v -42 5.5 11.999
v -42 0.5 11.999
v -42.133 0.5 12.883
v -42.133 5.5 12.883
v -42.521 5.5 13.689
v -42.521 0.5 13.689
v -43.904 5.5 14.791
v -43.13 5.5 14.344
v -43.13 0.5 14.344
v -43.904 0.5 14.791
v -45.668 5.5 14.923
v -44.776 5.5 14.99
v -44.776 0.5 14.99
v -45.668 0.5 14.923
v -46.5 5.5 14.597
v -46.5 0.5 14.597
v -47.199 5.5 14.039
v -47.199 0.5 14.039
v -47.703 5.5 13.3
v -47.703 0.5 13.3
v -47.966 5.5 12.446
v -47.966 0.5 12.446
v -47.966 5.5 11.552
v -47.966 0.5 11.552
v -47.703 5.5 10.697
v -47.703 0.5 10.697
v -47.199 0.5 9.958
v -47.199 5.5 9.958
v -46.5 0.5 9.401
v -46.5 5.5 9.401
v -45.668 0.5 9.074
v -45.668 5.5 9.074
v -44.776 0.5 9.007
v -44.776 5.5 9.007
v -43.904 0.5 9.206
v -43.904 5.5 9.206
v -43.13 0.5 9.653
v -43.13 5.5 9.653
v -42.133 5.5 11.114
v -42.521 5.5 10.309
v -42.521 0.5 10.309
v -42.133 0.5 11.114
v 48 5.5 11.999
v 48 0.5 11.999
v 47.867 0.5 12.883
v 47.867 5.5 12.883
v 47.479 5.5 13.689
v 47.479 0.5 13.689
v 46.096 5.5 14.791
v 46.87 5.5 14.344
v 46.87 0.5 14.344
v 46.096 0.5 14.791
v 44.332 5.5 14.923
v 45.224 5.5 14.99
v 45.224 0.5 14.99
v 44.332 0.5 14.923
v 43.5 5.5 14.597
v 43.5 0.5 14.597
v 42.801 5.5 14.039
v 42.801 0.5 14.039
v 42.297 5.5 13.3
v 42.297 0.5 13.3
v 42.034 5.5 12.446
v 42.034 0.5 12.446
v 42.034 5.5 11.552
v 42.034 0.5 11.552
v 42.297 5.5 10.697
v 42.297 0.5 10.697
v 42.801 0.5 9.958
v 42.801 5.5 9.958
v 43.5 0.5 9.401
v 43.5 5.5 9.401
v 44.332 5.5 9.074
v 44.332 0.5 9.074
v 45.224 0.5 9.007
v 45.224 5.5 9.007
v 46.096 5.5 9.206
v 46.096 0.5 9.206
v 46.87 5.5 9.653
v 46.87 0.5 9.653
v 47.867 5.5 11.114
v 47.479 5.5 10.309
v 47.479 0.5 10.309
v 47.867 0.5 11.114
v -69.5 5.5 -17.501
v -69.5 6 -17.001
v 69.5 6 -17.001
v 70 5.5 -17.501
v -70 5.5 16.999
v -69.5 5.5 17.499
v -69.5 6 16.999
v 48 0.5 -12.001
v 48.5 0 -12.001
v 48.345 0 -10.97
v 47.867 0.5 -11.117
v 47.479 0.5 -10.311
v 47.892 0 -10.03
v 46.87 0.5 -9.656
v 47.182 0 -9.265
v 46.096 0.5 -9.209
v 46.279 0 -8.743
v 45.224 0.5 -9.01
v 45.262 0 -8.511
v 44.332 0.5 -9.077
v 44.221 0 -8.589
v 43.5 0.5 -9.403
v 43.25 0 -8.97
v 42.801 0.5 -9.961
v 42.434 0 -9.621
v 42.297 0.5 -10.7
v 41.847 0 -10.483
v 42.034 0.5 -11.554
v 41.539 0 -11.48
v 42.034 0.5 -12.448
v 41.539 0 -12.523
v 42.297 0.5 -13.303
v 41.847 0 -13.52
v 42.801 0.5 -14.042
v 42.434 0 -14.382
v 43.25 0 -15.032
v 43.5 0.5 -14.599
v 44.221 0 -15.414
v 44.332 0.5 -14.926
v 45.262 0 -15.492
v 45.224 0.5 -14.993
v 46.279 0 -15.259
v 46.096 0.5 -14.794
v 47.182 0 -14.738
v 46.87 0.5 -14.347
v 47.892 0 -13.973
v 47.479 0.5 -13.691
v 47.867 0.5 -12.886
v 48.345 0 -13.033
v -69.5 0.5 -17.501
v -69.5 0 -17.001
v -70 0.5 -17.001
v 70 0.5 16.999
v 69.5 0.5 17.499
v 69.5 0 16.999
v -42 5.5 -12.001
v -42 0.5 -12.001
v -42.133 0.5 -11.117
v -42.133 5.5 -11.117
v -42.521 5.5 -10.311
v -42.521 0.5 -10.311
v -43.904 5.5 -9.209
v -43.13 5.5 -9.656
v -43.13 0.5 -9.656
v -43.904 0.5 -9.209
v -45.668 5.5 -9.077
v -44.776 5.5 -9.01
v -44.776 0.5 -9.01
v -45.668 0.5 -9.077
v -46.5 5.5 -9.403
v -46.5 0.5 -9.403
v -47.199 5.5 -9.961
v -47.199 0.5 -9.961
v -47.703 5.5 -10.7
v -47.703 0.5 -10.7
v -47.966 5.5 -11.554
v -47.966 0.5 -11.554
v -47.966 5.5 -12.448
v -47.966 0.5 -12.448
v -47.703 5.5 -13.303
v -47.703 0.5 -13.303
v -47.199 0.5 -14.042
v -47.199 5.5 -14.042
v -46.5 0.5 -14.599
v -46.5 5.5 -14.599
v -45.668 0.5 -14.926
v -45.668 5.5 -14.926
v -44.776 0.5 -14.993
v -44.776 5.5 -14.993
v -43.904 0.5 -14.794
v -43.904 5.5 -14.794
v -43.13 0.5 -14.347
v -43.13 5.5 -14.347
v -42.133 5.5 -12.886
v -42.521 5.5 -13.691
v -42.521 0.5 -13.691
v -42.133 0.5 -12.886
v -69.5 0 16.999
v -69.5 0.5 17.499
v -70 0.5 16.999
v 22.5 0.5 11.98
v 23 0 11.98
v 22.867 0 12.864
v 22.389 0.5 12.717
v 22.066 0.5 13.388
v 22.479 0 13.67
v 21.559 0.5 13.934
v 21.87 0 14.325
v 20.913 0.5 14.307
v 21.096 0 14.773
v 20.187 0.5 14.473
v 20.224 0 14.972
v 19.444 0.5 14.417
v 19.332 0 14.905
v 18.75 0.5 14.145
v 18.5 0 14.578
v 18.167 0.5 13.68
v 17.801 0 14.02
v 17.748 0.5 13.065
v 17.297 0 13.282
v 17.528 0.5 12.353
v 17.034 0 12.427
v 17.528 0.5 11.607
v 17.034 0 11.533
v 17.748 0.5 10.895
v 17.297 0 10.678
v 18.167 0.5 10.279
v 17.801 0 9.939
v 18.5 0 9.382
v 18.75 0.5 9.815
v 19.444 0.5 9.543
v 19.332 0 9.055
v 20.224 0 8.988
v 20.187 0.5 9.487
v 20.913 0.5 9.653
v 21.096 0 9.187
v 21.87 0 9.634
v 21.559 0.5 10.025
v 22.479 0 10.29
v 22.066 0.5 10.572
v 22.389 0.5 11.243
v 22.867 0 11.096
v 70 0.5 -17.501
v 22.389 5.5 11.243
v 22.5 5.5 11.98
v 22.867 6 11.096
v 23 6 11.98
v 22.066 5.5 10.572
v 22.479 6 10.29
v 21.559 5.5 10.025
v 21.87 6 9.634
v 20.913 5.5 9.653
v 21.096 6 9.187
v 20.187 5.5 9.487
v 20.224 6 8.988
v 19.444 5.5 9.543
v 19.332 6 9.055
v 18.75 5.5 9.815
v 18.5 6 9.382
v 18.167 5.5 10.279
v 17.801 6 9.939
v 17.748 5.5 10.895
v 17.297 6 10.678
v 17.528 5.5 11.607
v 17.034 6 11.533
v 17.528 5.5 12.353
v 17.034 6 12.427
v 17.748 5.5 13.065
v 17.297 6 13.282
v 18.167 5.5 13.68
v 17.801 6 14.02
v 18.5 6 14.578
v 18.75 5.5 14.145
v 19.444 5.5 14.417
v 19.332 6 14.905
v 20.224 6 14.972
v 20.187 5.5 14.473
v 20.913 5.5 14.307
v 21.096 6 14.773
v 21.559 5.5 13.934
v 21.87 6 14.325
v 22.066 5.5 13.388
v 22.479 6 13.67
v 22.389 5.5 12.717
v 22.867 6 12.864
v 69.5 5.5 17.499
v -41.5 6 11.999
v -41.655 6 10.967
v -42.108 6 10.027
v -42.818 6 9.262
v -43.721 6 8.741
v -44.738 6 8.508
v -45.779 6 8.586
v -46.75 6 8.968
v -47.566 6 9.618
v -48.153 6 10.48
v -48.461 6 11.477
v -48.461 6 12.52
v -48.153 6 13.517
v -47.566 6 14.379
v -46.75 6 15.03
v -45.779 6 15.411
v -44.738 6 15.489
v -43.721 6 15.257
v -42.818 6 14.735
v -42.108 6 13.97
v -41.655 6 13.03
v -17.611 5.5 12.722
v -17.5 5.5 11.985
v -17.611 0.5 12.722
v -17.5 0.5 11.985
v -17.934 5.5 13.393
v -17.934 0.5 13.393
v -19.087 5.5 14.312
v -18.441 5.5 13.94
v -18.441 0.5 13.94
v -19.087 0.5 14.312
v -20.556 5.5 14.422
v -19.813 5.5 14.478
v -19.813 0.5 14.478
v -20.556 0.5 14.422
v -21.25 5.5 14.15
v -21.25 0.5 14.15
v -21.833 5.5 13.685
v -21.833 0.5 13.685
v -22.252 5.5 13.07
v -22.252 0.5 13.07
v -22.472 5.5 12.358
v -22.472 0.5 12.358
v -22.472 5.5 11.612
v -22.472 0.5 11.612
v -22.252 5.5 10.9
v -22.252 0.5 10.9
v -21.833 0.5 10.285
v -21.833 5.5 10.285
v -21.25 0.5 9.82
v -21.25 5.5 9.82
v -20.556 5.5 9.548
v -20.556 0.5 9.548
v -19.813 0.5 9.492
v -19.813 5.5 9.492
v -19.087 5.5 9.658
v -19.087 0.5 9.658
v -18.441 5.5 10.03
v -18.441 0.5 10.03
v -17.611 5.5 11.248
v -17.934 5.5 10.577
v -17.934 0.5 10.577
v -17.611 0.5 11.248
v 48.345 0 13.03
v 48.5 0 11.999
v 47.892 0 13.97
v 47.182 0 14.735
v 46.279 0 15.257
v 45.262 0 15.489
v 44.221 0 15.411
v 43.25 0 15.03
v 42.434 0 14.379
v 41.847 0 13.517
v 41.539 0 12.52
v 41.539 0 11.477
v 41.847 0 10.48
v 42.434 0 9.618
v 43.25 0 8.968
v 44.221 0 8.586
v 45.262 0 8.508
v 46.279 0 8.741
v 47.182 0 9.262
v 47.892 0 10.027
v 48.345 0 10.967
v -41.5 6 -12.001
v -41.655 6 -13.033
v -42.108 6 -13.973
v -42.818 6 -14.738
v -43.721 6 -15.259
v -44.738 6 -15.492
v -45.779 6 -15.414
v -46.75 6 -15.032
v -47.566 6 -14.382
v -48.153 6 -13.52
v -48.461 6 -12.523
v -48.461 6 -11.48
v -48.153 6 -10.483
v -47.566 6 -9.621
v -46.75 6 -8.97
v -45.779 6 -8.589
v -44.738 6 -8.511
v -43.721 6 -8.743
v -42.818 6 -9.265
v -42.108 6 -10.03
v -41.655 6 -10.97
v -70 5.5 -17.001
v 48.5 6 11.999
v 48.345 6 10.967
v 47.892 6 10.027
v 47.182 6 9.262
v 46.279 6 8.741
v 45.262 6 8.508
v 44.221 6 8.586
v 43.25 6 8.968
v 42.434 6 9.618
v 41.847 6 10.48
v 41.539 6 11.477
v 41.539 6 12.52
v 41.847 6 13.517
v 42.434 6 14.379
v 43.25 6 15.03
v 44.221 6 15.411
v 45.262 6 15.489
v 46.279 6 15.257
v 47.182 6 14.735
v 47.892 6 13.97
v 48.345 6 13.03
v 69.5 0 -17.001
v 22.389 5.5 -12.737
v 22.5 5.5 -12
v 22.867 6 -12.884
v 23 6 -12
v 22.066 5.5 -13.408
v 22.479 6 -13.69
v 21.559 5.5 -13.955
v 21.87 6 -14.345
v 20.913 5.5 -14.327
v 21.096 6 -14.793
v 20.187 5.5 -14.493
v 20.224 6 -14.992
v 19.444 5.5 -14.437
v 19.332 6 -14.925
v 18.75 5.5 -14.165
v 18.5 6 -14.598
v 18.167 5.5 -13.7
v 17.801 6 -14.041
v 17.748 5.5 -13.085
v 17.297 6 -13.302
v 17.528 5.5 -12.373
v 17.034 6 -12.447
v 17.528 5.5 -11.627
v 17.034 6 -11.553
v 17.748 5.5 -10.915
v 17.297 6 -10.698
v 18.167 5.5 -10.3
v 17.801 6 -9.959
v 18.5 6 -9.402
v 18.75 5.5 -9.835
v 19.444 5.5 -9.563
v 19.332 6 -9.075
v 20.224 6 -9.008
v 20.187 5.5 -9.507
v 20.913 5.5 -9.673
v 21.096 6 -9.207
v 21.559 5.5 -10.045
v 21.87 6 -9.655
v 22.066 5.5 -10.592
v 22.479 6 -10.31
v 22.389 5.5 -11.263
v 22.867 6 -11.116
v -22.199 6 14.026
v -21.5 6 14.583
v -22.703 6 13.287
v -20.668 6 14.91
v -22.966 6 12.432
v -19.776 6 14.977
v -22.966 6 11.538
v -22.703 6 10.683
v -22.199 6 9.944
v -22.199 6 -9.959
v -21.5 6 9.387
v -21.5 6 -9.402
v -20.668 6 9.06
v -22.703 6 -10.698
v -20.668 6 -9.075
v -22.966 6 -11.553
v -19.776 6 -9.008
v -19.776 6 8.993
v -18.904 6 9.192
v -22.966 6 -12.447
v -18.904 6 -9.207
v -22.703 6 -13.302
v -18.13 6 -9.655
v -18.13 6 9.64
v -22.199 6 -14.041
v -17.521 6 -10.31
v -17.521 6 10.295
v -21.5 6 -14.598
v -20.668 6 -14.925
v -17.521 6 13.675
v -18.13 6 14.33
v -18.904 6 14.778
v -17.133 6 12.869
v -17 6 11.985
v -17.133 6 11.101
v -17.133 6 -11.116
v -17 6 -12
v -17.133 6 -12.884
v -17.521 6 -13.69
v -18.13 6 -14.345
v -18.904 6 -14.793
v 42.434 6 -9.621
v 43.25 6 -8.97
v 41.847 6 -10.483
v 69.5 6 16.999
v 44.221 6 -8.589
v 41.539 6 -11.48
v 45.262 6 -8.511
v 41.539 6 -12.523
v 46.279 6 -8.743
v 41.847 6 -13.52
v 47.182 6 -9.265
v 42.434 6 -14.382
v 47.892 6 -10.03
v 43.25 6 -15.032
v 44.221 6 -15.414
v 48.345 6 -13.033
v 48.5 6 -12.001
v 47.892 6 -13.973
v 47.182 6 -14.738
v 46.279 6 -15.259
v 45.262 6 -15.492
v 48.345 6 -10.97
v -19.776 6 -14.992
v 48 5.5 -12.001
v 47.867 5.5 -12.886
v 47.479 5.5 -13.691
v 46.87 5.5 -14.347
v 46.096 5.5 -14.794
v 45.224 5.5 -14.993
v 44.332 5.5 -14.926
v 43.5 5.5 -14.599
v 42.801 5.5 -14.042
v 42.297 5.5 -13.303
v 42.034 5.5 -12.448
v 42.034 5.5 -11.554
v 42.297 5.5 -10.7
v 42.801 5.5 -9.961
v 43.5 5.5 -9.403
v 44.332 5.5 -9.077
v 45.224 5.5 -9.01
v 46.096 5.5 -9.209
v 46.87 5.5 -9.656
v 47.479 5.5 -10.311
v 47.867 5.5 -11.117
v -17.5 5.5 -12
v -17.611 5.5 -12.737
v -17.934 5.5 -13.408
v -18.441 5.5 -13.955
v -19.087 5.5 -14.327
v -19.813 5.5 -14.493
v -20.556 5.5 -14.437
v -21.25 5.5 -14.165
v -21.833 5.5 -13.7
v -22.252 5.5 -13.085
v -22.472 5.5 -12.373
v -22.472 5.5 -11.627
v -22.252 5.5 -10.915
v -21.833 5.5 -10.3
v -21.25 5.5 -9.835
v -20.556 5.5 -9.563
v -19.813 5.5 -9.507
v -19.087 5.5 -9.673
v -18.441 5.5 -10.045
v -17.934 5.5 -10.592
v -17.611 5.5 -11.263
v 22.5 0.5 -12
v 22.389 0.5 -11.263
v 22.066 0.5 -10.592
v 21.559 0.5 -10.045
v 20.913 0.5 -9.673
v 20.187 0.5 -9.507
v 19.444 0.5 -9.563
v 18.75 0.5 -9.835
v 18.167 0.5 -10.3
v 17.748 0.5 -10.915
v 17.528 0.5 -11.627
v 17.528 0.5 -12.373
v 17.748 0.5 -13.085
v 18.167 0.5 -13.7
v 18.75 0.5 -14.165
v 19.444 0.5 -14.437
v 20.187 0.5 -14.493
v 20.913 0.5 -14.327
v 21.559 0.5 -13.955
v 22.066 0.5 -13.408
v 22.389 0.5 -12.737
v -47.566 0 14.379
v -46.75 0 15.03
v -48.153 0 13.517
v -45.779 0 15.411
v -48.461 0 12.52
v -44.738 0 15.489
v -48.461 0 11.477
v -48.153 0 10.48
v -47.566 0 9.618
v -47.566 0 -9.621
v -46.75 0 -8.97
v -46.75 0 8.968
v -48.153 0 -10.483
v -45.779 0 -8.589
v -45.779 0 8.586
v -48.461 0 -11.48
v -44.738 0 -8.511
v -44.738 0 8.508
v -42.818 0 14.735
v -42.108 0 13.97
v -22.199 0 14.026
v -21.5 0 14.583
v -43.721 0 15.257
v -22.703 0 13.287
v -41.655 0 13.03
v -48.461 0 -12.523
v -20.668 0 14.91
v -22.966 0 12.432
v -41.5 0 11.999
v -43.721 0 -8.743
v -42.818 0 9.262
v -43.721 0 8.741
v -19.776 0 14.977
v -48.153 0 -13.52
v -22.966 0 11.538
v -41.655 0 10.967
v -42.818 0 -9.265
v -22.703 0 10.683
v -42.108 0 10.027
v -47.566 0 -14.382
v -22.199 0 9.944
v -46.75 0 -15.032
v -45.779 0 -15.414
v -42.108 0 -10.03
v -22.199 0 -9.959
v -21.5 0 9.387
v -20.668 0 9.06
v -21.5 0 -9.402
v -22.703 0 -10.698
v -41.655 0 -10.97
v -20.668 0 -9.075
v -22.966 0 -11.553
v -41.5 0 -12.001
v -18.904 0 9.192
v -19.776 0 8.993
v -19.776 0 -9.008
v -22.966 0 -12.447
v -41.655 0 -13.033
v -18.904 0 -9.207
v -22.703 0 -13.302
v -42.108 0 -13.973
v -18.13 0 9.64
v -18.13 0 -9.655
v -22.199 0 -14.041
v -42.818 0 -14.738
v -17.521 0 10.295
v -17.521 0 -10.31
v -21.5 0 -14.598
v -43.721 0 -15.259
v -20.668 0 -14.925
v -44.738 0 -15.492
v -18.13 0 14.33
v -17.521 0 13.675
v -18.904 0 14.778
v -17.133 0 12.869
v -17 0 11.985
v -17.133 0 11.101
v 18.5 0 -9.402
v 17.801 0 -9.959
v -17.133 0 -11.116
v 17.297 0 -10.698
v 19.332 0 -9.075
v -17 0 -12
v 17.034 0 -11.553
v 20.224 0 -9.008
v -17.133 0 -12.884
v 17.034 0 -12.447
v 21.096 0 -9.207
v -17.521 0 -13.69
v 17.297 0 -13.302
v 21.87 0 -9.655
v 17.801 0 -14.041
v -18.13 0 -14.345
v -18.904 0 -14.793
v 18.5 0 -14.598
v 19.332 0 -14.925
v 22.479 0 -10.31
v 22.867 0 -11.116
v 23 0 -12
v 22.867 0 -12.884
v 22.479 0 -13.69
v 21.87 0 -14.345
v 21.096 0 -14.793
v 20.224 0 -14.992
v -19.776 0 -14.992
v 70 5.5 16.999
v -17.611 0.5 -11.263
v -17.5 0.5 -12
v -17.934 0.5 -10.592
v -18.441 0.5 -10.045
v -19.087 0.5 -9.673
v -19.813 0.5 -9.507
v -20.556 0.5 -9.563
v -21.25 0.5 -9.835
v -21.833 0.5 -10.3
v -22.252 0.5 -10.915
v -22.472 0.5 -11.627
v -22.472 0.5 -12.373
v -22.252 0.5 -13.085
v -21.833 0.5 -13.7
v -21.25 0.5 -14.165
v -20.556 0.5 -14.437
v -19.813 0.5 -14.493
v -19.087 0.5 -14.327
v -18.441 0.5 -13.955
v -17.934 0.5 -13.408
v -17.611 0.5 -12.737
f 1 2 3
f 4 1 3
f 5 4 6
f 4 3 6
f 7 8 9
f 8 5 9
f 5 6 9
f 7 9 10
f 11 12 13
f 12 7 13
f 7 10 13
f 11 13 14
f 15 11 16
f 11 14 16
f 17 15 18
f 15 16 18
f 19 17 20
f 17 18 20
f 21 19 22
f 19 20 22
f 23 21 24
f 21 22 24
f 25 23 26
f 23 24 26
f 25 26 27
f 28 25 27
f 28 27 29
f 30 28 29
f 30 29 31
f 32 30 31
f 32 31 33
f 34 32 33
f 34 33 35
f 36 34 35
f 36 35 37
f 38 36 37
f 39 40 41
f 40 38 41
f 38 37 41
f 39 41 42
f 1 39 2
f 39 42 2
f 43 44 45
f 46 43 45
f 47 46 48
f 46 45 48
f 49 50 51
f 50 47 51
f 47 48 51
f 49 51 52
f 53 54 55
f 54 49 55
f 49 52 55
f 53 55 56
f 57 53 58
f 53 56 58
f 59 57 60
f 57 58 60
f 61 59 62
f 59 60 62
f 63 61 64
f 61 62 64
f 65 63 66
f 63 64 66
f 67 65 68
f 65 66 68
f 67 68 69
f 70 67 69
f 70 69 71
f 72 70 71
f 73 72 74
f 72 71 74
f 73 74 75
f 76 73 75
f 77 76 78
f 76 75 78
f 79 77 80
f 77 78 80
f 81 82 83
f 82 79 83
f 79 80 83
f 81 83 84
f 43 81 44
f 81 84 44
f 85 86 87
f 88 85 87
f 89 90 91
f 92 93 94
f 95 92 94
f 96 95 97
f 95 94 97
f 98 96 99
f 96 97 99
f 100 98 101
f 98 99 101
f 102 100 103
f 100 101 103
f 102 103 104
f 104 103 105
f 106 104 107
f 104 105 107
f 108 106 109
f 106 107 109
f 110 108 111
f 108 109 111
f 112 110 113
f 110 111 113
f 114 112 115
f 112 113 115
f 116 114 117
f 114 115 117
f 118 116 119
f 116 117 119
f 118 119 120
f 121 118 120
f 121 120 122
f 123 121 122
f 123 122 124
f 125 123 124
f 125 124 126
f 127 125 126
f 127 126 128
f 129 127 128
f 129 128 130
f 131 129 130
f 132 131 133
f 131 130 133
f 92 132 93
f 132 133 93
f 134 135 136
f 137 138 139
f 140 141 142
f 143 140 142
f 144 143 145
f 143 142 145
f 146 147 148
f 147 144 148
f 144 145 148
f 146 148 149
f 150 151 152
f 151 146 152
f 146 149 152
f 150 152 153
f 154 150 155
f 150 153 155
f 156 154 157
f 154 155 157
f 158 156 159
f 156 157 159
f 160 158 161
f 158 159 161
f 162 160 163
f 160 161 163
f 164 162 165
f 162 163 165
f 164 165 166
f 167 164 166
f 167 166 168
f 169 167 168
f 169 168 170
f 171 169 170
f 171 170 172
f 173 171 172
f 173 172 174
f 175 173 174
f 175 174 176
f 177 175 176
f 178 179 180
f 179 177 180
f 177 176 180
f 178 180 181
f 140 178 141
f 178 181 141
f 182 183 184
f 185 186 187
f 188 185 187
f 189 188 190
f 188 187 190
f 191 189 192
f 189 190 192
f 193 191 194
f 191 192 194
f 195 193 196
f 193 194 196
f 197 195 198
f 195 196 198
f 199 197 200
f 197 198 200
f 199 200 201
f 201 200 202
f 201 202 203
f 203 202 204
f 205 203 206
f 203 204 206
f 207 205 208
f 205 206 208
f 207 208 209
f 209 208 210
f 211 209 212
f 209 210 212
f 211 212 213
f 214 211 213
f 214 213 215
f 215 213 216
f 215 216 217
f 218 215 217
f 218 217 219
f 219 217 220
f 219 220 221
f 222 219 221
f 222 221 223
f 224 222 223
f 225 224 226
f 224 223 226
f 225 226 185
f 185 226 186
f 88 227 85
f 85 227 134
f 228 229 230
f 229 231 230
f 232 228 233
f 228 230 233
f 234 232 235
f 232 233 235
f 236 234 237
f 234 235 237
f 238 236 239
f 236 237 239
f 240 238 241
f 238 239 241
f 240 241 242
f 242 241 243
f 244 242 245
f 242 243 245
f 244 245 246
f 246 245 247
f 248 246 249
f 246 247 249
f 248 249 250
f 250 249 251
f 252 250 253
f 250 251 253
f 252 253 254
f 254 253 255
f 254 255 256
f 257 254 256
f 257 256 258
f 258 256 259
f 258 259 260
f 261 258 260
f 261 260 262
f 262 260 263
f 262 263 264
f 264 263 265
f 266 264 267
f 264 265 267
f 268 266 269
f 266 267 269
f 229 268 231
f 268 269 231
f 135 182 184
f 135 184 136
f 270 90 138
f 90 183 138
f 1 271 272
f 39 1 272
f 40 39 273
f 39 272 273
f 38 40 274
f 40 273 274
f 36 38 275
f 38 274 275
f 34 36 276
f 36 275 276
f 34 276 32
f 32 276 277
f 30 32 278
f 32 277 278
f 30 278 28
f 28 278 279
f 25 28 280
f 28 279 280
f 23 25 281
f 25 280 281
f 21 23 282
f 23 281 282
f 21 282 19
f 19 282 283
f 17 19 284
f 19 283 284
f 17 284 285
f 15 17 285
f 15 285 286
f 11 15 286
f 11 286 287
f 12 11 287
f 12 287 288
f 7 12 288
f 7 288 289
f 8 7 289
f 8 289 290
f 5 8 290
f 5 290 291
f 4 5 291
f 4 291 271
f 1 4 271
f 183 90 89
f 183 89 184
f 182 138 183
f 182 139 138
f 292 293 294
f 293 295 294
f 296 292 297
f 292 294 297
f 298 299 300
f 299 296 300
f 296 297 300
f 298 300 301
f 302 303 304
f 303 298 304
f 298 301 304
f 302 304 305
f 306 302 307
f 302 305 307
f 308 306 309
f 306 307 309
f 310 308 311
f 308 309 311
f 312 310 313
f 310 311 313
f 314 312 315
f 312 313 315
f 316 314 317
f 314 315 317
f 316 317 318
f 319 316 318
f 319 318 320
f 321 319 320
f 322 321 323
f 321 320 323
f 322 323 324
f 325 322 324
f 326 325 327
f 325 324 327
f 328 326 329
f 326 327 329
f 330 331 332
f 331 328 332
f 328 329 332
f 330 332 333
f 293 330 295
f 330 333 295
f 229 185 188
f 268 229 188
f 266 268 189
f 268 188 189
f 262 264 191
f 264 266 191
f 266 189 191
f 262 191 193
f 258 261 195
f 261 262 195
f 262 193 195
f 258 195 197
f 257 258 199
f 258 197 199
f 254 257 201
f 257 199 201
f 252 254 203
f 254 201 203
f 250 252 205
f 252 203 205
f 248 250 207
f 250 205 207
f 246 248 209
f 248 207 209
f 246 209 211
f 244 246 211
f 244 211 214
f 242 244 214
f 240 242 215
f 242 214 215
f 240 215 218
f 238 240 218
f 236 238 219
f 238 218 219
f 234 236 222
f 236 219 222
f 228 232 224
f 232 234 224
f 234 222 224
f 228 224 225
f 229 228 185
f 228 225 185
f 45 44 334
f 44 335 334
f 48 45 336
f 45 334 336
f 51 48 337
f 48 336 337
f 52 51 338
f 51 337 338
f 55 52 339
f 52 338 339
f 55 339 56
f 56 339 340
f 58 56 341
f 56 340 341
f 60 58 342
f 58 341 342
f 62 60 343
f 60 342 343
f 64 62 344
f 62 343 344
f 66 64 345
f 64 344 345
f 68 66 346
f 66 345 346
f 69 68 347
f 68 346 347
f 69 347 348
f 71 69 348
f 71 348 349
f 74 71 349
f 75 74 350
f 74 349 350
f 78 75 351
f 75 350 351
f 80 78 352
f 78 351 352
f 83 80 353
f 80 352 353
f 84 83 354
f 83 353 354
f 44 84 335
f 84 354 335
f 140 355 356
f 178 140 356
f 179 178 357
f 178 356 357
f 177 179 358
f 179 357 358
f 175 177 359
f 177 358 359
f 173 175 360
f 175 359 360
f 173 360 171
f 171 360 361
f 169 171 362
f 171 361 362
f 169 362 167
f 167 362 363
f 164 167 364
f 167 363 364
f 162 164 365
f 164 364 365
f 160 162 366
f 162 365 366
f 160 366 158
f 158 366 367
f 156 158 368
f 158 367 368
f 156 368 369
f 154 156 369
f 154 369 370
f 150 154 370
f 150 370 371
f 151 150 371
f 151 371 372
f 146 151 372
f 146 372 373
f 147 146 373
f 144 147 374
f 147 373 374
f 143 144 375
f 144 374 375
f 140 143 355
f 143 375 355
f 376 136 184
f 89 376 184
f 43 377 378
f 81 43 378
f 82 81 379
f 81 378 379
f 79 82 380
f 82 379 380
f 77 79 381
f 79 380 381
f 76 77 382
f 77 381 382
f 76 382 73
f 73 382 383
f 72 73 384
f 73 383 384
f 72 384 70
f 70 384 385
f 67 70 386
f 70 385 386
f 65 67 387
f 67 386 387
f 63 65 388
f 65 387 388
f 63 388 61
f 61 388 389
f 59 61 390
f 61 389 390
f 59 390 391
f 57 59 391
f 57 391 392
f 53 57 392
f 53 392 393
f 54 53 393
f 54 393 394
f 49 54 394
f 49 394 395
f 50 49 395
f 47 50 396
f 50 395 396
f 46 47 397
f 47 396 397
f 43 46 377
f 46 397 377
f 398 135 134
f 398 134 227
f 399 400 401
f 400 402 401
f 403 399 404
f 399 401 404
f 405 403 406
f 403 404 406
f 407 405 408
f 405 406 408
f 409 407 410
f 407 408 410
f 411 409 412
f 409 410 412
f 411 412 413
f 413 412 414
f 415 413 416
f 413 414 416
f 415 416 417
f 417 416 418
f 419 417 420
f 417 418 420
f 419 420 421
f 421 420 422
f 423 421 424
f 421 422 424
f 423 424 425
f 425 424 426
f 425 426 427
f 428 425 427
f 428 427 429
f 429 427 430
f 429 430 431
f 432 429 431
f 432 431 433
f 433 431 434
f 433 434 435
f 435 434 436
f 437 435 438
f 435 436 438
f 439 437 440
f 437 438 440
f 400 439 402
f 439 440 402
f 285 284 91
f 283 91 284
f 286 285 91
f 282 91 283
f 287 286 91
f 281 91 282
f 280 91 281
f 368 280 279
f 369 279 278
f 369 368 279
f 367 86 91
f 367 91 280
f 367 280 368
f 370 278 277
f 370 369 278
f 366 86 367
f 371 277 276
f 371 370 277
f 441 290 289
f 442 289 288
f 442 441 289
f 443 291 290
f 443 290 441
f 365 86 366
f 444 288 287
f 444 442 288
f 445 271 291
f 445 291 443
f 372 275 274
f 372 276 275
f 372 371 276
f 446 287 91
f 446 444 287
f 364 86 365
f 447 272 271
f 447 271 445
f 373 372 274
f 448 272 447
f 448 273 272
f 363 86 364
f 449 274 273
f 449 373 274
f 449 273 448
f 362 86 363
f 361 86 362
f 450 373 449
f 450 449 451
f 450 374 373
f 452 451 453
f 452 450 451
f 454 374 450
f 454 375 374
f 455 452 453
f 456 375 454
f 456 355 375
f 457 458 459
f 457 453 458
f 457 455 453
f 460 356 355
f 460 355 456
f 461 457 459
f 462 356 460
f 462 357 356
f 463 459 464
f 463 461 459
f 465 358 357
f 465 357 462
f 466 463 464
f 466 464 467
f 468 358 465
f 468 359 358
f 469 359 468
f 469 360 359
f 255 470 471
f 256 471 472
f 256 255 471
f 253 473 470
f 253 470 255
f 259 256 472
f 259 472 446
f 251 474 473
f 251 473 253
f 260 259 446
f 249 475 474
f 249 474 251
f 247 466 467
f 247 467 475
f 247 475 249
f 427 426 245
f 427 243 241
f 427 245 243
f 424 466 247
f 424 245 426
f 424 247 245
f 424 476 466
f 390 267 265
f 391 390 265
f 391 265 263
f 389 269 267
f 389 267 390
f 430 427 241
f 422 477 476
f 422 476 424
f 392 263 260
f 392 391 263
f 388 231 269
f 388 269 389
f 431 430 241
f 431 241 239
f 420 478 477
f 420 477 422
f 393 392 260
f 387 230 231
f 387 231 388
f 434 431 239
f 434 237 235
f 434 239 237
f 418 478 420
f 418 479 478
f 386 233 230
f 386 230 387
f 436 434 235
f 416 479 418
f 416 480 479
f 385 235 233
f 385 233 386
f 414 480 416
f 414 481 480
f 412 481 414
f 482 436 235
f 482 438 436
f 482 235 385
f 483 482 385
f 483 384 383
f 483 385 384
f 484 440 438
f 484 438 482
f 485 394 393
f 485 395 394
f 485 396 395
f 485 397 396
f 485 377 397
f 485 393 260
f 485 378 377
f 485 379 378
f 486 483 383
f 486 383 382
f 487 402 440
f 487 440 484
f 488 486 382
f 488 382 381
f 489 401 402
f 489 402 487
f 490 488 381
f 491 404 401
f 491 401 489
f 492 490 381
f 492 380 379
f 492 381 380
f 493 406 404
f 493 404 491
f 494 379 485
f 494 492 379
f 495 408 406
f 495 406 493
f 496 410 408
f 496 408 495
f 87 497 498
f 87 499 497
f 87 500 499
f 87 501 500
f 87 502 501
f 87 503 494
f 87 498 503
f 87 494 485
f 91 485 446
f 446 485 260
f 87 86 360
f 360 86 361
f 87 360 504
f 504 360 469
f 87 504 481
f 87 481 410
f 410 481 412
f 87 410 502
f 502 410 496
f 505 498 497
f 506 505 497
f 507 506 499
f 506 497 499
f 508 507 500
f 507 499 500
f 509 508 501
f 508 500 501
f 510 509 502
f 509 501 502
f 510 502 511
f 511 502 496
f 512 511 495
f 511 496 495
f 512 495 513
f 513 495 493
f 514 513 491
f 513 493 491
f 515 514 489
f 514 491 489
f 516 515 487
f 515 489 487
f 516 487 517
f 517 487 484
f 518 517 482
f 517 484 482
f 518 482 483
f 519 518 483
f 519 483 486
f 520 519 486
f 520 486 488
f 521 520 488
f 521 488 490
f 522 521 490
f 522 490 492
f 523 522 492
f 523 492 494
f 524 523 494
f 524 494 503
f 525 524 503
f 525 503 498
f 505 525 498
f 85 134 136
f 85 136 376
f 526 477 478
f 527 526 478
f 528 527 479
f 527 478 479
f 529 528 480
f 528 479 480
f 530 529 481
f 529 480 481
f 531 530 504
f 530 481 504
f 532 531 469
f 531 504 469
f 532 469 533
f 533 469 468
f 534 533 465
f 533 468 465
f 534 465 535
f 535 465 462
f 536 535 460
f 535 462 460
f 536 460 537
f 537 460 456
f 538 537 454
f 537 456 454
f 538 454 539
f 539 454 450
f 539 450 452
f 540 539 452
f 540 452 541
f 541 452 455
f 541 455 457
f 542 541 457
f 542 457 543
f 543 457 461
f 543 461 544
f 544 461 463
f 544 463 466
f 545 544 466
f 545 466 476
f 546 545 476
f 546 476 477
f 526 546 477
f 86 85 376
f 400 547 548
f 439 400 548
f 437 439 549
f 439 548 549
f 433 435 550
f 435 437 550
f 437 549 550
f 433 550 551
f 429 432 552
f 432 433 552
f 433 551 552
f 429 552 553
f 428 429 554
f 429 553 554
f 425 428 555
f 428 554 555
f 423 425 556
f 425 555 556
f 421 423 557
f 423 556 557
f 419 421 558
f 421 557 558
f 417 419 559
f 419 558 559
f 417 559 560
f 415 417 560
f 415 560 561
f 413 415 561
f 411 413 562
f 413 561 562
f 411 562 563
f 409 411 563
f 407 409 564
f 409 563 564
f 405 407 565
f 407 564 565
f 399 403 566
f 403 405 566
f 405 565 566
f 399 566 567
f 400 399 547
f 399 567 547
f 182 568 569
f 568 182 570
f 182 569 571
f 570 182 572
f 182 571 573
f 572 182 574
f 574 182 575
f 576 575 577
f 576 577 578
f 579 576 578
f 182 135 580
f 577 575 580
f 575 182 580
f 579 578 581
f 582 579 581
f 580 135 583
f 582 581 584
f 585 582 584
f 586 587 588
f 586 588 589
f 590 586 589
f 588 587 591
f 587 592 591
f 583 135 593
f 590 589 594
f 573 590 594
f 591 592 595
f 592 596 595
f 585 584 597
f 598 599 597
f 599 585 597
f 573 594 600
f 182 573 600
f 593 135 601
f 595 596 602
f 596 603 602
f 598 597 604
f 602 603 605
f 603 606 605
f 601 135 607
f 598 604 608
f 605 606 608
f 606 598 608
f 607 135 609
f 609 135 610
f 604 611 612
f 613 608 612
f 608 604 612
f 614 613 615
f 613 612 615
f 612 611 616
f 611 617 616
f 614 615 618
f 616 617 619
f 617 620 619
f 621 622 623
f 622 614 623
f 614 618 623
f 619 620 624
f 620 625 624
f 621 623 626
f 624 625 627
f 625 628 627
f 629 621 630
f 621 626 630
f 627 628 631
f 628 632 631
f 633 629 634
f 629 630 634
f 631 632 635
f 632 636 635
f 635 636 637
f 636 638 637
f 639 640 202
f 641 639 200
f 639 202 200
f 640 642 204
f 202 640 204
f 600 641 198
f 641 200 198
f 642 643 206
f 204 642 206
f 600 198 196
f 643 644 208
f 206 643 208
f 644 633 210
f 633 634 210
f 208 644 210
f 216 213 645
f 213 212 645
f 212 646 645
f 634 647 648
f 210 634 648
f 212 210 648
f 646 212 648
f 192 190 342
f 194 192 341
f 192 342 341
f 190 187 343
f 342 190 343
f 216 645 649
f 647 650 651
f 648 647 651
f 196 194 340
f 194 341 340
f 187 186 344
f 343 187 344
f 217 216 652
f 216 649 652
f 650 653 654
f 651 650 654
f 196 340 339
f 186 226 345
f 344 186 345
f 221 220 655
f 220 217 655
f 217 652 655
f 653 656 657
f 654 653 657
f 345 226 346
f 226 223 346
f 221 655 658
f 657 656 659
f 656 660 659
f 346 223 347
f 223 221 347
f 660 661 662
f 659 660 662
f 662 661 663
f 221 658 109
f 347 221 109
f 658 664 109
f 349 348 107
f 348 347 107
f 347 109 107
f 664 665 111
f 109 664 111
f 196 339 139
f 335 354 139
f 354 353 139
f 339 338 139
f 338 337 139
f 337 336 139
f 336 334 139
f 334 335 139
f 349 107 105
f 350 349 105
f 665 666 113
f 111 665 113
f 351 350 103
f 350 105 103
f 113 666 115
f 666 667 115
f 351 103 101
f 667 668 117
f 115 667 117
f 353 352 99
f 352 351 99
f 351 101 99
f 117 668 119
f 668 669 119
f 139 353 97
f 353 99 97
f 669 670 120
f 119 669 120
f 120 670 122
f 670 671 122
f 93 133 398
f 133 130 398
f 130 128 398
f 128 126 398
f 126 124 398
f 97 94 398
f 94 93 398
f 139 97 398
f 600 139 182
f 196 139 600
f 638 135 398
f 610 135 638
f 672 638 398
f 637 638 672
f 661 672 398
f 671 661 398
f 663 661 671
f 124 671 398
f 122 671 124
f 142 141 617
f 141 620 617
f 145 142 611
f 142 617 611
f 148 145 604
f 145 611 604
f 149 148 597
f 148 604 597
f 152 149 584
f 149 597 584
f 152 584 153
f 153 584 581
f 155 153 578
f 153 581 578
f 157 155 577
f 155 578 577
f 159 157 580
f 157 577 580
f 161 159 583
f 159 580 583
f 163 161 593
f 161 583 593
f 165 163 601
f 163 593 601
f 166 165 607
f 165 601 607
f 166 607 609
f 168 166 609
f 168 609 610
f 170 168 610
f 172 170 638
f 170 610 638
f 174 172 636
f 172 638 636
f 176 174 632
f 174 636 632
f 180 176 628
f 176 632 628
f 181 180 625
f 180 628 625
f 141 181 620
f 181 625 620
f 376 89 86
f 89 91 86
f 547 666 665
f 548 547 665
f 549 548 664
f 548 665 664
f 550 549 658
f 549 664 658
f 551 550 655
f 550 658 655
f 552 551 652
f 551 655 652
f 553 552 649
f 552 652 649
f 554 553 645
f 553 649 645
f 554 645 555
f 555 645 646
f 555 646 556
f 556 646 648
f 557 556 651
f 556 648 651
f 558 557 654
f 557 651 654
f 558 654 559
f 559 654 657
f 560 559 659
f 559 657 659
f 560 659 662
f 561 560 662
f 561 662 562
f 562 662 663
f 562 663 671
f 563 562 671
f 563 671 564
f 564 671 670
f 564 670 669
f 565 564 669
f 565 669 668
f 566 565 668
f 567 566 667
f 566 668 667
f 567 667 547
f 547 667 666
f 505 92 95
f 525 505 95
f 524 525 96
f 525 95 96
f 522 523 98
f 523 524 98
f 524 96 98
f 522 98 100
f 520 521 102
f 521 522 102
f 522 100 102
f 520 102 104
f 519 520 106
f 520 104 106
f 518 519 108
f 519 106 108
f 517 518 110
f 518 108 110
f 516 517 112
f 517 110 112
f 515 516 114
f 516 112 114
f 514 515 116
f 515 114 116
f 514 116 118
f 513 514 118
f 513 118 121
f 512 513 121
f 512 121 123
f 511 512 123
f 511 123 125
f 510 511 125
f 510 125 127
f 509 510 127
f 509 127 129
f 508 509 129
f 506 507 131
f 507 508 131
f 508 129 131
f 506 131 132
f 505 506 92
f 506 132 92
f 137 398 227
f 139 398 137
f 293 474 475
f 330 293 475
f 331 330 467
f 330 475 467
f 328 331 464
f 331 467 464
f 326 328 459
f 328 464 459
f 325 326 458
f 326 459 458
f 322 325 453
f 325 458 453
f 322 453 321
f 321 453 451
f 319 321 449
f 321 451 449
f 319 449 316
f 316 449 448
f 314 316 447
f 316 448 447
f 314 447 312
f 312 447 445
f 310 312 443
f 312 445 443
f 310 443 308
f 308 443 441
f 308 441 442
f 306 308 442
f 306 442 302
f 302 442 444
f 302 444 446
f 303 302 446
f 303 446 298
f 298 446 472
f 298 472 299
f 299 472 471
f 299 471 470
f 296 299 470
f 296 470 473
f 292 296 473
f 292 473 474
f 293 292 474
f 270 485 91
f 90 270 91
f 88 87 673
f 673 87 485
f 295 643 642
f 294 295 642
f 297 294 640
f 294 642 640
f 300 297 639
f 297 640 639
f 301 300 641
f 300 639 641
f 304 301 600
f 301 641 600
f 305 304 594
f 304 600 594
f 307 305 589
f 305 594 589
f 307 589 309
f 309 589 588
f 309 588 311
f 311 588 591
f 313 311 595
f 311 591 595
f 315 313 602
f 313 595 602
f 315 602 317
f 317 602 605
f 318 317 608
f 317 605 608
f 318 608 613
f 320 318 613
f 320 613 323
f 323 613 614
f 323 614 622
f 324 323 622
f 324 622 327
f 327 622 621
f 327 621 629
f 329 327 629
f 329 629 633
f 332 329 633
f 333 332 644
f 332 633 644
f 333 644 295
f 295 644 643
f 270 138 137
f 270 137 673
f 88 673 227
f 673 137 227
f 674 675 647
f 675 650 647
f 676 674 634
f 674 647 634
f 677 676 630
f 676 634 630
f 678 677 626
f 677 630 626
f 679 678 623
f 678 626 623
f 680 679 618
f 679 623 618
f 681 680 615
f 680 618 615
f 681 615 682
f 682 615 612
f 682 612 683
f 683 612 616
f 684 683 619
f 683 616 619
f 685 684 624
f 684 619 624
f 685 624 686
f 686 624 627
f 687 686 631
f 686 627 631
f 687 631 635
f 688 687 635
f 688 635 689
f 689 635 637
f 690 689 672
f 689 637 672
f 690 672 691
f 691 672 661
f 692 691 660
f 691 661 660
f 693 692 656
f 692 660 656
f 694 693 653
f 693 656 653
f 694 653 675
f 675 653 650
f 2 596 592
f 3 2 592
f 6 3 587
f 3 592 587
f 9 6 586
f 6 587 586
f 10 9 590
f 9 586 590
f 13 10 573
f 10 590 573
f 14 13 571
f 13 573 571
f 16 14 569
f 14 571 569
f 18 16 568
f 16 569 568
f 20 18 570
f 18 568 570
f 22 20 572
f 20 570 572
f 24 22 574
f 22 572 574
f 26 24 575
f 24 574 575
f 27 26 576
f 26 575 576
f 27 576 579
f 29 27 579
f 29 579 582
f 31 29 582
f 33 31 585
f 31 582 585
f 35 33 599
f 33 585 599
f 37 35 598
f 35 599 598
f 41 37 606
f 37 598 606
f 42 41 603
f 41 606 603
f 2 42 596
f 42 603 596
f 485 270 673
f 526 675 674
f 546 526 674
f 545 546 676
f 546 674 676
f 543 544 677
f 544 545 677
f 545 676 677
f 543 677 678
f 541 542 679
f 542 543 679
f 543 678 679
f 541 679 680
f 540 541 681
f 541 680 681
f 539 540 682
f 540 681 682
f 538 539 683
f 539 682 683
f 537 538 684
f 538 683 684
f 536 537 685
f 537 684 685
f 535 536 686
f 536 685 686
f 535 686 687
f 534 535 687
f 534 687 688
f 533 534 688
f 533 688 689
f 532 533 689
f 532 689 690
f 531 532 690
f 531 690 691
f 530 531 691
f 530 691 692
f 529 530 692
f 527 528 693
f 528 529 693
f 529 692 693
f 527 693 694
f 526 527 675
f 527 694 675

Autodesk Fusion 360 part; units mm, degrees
sketch "Z motor reinforcement" plane through (0, 0, 0) normal (0, 1, 0) x (1, 0, 0)
  line L0 (-70, -17.4987) -> (70, -17.4987)
  circle A0 centre (-45, -11.9987) radius 3
  circle A1 centre (-45, 12.0013) radius 3
  circle A2 centre (45, -11.9987) radius 3
  circle A3 centre (45, 12.0013) radius 3
  circle A4 centre (20, -11.9799) radius 2.5
  line L1 (45, -13.5) -> (45, 16.5) construction
  line L2 (20, -13.5) -> (20, 16.5) construction
  line L3 (-54.8652, -11.9987) -> (55.1348, -11.9987) construction
  line L4 (70, 17.5013) -> (-70, 17.5013)
  line L5 (-45, -13.5) -> (-45, 16.5) construction
  line L6 (70, -17.4987) -> (70, 17.5013)
  line L7 (20, -11.9799) -> (20, 12) construction
  circle A5 centre (20, 12) radius 2.5
  line L8 (-55, 12.0013) -> (55, 12.0013) construction
  circle A6 centre (-20, 12) radius 2.5
  line L9 (-70, 17.5013) -> (-70, -17.4987)
  line L10 (-20, -11.985) -> (-20, 12) construction
  line L11 (-20, -13.5) -> (-20, 16.5) construction
  circle A7 centre (-20, -11.985) radius 2.5
  dimension "d1" = 140
  dimension "d2" = 35
  dimension "d3" = 110
  dimension "d4" = 24
  dimension "d5" = 25
  dimension "d6" = 40
  dimension "d7" = 25
  dimension "d8" = 25
  dimension "d9" = 6
  dimension "d10" = 6
  dimension "d11" = 6
  dimension "d12" = 6
  dimension "d13" = 5
  dimension "d14" = 5
  dimension "d15" = 5
  dimension "d16" = 5
  dimension "d17" = 5.5
extrude "Extrude1" add sketch "Z motor reinforcement" along normal blind 6 makes body 1
copy_body "Body->Comp1" bodies 1 removing the originals makes body 2 in component "Z motor reinforcement"
chamfer "Chamfer1" distance 0.5 angle 45 27 edges at (0, 0, 17.4987) (-70, 3, 17.4987) (0, 6, 17.4987) (70, 3, 17.4987) (70, 6, -0.0013) (70, 0, -0.0013) (0, 0, -17.5013) (-70, 0, -0.0013) (-47.797, 0, 10.9138) (-47.797, 0, -13.0862) (-22.3308, 0, 11.081) (-22.3308, 0, -12.904) (17.6692, 0, 11.0759) (17.6692, 0, -12.904) (42.203, 0, 10.9138) (42.203, 0, -13.0862) (0, 6, -17.5013) (-70, 3, -17.5013) (-70, 6, -0.0013) (-47.797, 6, -13.0862) (-47.797, 6, 10.9138) (-22.3308, 6, 11.081) (17.6692, 6, 11.0759) (42.203, 6, 10.9138) (42.203, 6, -13.0862) (17.6692, 6, -12.904) (-22.3308, 6, -12.904) on bodies 2 in component "Z motor reinforcement"
component "Z motor reinforcement" placed x (1, 0, 0) y (0, 1, 0) z (0, 0, 1) at (0, 0, 0)
